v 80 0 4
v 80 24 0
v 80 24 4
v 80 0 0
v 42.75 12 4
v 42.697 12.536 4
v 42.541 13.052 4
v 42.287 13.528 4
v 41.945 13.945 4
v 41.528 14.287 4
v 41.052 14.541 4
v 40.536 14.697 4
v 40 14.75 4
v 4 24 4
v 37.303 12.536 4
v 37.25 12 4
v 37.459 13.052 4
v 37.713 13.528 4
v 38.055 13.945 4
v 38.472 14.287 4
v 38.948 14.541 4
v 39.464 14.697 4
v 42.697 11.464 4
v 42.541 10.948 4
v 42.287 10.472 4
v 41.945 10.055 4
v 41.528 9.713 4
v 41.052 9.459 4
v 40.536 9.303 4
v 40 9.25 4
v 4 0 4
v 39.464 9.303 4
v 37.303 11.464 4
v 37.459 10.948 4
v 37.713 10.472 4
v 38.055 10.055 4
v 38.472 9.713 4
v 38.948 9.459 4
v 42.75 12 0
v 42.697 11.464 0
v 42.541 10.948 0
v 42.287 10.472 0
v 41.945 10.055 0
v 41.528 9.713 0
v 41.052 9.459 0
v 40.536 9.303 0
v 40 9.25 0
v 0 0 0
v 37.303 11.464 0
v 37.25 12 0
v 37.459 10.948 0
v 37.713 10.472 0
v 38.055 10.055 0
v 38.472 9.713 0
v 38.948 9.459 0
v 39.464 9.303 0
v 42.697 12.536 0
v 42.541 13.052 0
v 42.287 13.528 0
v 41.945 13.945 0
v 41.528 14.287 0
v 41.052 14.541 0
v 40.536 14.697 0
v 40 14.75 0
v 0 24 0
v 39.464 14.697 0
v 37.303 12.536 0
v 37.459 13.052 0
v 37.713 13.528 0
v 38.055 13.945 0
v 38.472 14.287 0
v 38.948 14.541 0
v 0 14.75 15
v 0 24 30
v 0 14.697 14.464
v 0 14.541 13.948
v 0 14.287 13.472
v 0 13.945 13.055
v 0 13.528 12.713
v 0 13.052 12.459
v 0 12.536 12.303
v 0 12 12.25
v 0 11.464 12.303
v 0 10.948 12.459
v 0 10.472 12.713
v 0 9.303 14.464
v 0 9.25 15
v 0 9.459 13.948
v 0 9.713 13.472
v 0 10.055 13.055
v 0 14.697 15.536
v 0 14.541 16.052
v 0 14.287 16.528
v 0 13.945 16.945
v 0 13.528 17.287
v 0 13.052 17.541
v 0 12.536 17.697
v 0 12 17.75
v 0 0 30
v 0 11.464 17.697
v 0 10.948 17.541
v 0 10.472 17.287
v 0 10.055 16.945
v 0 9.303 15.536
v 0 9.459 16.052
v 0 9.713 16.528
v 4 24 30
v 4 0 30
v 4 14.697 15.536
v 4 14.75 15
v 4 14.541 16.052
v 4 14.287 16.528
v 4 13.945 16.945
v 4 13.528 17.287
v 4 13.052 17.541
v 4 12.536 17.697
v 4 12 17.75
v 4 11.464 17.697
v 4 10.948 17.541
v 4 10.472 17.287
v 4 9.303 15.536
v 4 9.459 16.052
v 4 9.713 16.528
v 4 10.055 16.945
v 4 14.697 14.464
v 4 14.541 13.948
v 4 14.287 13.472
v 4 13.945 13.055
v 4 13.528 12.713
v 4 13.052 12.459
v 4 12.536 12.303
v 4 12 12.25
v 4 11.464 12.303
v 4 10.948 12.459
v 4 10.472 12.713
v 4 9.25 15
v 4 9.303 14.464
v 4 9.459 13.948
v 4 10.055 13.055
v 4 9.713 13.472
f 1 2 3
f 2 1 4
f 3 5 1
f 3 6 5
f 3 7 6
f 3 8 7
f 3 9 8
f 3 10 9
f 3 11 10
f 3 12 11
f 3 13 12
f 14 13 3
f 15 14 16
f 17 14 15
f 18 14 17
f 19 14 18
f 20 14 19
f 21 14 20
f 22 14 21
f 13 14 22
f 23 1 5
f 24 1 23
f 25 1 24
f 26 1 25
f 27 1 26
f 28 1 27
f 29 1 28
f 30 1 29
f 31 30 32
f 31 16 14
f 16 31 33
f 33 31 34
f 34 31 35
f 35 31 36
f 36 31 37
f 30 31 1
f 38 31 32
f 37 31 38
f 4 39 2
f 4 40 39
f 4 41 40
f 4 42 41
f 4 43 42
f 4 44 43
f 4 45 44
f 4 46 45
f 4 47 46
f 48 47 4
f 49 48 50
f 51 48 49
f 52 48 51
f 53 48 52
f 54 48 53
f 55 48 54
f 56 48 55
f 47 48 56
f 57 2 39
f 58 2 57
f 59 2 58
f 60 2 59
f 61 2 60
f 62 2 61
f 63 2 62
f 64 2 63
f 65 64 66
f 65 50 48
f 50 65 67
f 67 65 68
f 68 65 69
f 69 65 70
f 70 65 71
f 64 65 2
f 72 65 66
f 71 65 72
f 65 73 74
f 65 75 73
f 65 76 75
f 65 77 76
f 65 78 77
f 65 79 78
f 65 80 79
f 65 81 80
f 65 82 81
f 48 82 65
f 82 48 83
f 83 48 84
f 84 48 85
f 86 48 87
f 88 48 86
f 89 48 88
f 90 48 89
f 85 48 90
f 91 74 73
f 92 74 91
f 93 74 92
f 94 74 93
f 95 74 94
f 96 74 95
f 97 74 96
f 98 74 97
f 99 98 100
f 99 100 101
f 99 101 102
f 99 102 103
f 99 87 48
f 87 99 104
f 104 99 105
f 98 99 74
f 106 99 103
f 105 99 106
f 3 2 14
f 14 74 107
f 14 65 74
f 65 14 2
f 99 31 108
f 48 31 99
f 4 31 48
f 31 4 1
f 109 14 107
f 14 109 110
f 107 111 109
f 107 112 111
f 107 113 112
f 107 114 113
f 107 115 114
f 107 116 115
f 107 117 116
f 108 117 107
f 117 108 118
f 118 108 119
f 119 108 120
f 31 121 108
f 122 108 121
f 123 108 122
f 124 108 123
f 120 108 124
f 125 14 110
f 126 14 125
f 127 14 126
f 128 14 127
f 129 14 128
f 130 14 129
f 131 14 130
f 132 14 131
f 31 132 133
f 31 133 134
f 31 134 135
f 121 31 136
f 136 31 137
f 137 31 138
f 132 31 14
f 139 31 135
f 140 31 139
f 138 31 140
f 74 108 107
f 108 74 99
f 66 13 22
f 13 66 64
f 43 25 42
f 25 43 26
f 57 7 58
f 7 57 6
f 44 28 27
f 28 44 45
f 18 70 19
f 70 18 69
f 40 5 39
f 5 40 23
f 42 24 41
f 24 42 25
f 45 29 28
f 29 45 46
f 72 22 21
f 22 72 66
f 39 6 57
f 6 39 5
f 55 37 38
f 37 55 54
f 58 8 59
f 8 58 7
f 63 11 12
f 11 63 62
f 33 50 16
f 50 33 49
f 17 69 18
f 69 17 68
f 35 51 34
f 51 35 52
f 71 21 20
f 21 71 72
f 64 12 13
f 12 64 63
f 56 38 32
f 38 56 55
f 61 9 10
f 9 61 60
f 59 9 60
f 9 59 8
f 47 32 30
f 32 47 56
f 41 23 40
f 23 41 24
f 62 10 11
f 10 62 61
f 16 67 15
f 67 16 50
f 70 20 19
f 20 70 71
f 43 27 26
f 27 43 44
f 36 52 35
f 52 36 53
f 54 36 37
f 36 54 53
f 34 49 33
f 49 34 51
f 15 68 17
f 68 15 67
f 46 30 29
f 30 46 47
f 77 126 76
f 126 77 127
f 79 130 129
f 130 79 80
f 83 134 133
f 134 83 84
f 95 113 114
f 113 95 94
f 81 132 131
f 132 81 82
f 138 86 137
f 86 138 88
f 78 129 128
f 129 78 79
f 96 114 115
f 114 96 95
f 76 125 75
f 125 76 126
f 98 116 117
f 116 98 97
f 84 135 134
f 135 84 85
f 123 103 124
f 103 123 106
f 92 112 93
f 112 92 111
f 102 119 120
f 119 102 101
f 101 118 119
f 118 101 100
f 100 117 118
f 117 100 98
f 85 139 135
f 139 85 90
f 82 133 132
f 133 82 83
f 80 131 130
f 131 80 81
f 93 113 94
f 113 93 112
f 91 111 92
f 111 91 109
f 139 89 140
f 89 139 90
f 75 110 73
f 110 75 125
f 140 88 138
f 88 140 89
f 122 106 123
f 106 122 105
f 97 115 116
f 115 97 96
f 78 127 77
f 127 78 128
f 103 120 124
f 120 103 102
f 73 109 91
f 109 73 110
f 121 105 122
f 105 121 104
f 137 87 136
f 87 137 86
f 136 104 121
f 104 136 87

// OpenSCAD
$fn = 32;

// ----------------------------------------------------------------------
// L-bracket: 80 x 24 x 30 mm
// ----------------------------------------------------------------------

// --- parameters (mm) ---
horiz_len = 80;           // horizontal leg, X
vert_len = 30;            // vertical leg, Z
profile_w = 24;           // bracket depth, Y
plate_t = 4;              // plate thickness
hole_d = 5.5;             // clearance for M5

module hole_z(px, py) {
  translate([px, py, -0.5]) cylinder(h = plate_t + 1, d = hole_d);
}
module hole_x(pz, py) {
  translate([-0.5, py, pz]) rotate([0, 90, 0]) cylinder(h = plate_t + 1, d = hole_d);
}

difference() {
  union() {
    /* horizontal leg */
    cube([horiz_len, profile_w, plate_t]);
    /* vertical leg, overlapping the corner block */
    cube([plate_t, profile_w, vert_len]);
  }
  hole_z(40, 12);
  hole_x(15, 12);
}
